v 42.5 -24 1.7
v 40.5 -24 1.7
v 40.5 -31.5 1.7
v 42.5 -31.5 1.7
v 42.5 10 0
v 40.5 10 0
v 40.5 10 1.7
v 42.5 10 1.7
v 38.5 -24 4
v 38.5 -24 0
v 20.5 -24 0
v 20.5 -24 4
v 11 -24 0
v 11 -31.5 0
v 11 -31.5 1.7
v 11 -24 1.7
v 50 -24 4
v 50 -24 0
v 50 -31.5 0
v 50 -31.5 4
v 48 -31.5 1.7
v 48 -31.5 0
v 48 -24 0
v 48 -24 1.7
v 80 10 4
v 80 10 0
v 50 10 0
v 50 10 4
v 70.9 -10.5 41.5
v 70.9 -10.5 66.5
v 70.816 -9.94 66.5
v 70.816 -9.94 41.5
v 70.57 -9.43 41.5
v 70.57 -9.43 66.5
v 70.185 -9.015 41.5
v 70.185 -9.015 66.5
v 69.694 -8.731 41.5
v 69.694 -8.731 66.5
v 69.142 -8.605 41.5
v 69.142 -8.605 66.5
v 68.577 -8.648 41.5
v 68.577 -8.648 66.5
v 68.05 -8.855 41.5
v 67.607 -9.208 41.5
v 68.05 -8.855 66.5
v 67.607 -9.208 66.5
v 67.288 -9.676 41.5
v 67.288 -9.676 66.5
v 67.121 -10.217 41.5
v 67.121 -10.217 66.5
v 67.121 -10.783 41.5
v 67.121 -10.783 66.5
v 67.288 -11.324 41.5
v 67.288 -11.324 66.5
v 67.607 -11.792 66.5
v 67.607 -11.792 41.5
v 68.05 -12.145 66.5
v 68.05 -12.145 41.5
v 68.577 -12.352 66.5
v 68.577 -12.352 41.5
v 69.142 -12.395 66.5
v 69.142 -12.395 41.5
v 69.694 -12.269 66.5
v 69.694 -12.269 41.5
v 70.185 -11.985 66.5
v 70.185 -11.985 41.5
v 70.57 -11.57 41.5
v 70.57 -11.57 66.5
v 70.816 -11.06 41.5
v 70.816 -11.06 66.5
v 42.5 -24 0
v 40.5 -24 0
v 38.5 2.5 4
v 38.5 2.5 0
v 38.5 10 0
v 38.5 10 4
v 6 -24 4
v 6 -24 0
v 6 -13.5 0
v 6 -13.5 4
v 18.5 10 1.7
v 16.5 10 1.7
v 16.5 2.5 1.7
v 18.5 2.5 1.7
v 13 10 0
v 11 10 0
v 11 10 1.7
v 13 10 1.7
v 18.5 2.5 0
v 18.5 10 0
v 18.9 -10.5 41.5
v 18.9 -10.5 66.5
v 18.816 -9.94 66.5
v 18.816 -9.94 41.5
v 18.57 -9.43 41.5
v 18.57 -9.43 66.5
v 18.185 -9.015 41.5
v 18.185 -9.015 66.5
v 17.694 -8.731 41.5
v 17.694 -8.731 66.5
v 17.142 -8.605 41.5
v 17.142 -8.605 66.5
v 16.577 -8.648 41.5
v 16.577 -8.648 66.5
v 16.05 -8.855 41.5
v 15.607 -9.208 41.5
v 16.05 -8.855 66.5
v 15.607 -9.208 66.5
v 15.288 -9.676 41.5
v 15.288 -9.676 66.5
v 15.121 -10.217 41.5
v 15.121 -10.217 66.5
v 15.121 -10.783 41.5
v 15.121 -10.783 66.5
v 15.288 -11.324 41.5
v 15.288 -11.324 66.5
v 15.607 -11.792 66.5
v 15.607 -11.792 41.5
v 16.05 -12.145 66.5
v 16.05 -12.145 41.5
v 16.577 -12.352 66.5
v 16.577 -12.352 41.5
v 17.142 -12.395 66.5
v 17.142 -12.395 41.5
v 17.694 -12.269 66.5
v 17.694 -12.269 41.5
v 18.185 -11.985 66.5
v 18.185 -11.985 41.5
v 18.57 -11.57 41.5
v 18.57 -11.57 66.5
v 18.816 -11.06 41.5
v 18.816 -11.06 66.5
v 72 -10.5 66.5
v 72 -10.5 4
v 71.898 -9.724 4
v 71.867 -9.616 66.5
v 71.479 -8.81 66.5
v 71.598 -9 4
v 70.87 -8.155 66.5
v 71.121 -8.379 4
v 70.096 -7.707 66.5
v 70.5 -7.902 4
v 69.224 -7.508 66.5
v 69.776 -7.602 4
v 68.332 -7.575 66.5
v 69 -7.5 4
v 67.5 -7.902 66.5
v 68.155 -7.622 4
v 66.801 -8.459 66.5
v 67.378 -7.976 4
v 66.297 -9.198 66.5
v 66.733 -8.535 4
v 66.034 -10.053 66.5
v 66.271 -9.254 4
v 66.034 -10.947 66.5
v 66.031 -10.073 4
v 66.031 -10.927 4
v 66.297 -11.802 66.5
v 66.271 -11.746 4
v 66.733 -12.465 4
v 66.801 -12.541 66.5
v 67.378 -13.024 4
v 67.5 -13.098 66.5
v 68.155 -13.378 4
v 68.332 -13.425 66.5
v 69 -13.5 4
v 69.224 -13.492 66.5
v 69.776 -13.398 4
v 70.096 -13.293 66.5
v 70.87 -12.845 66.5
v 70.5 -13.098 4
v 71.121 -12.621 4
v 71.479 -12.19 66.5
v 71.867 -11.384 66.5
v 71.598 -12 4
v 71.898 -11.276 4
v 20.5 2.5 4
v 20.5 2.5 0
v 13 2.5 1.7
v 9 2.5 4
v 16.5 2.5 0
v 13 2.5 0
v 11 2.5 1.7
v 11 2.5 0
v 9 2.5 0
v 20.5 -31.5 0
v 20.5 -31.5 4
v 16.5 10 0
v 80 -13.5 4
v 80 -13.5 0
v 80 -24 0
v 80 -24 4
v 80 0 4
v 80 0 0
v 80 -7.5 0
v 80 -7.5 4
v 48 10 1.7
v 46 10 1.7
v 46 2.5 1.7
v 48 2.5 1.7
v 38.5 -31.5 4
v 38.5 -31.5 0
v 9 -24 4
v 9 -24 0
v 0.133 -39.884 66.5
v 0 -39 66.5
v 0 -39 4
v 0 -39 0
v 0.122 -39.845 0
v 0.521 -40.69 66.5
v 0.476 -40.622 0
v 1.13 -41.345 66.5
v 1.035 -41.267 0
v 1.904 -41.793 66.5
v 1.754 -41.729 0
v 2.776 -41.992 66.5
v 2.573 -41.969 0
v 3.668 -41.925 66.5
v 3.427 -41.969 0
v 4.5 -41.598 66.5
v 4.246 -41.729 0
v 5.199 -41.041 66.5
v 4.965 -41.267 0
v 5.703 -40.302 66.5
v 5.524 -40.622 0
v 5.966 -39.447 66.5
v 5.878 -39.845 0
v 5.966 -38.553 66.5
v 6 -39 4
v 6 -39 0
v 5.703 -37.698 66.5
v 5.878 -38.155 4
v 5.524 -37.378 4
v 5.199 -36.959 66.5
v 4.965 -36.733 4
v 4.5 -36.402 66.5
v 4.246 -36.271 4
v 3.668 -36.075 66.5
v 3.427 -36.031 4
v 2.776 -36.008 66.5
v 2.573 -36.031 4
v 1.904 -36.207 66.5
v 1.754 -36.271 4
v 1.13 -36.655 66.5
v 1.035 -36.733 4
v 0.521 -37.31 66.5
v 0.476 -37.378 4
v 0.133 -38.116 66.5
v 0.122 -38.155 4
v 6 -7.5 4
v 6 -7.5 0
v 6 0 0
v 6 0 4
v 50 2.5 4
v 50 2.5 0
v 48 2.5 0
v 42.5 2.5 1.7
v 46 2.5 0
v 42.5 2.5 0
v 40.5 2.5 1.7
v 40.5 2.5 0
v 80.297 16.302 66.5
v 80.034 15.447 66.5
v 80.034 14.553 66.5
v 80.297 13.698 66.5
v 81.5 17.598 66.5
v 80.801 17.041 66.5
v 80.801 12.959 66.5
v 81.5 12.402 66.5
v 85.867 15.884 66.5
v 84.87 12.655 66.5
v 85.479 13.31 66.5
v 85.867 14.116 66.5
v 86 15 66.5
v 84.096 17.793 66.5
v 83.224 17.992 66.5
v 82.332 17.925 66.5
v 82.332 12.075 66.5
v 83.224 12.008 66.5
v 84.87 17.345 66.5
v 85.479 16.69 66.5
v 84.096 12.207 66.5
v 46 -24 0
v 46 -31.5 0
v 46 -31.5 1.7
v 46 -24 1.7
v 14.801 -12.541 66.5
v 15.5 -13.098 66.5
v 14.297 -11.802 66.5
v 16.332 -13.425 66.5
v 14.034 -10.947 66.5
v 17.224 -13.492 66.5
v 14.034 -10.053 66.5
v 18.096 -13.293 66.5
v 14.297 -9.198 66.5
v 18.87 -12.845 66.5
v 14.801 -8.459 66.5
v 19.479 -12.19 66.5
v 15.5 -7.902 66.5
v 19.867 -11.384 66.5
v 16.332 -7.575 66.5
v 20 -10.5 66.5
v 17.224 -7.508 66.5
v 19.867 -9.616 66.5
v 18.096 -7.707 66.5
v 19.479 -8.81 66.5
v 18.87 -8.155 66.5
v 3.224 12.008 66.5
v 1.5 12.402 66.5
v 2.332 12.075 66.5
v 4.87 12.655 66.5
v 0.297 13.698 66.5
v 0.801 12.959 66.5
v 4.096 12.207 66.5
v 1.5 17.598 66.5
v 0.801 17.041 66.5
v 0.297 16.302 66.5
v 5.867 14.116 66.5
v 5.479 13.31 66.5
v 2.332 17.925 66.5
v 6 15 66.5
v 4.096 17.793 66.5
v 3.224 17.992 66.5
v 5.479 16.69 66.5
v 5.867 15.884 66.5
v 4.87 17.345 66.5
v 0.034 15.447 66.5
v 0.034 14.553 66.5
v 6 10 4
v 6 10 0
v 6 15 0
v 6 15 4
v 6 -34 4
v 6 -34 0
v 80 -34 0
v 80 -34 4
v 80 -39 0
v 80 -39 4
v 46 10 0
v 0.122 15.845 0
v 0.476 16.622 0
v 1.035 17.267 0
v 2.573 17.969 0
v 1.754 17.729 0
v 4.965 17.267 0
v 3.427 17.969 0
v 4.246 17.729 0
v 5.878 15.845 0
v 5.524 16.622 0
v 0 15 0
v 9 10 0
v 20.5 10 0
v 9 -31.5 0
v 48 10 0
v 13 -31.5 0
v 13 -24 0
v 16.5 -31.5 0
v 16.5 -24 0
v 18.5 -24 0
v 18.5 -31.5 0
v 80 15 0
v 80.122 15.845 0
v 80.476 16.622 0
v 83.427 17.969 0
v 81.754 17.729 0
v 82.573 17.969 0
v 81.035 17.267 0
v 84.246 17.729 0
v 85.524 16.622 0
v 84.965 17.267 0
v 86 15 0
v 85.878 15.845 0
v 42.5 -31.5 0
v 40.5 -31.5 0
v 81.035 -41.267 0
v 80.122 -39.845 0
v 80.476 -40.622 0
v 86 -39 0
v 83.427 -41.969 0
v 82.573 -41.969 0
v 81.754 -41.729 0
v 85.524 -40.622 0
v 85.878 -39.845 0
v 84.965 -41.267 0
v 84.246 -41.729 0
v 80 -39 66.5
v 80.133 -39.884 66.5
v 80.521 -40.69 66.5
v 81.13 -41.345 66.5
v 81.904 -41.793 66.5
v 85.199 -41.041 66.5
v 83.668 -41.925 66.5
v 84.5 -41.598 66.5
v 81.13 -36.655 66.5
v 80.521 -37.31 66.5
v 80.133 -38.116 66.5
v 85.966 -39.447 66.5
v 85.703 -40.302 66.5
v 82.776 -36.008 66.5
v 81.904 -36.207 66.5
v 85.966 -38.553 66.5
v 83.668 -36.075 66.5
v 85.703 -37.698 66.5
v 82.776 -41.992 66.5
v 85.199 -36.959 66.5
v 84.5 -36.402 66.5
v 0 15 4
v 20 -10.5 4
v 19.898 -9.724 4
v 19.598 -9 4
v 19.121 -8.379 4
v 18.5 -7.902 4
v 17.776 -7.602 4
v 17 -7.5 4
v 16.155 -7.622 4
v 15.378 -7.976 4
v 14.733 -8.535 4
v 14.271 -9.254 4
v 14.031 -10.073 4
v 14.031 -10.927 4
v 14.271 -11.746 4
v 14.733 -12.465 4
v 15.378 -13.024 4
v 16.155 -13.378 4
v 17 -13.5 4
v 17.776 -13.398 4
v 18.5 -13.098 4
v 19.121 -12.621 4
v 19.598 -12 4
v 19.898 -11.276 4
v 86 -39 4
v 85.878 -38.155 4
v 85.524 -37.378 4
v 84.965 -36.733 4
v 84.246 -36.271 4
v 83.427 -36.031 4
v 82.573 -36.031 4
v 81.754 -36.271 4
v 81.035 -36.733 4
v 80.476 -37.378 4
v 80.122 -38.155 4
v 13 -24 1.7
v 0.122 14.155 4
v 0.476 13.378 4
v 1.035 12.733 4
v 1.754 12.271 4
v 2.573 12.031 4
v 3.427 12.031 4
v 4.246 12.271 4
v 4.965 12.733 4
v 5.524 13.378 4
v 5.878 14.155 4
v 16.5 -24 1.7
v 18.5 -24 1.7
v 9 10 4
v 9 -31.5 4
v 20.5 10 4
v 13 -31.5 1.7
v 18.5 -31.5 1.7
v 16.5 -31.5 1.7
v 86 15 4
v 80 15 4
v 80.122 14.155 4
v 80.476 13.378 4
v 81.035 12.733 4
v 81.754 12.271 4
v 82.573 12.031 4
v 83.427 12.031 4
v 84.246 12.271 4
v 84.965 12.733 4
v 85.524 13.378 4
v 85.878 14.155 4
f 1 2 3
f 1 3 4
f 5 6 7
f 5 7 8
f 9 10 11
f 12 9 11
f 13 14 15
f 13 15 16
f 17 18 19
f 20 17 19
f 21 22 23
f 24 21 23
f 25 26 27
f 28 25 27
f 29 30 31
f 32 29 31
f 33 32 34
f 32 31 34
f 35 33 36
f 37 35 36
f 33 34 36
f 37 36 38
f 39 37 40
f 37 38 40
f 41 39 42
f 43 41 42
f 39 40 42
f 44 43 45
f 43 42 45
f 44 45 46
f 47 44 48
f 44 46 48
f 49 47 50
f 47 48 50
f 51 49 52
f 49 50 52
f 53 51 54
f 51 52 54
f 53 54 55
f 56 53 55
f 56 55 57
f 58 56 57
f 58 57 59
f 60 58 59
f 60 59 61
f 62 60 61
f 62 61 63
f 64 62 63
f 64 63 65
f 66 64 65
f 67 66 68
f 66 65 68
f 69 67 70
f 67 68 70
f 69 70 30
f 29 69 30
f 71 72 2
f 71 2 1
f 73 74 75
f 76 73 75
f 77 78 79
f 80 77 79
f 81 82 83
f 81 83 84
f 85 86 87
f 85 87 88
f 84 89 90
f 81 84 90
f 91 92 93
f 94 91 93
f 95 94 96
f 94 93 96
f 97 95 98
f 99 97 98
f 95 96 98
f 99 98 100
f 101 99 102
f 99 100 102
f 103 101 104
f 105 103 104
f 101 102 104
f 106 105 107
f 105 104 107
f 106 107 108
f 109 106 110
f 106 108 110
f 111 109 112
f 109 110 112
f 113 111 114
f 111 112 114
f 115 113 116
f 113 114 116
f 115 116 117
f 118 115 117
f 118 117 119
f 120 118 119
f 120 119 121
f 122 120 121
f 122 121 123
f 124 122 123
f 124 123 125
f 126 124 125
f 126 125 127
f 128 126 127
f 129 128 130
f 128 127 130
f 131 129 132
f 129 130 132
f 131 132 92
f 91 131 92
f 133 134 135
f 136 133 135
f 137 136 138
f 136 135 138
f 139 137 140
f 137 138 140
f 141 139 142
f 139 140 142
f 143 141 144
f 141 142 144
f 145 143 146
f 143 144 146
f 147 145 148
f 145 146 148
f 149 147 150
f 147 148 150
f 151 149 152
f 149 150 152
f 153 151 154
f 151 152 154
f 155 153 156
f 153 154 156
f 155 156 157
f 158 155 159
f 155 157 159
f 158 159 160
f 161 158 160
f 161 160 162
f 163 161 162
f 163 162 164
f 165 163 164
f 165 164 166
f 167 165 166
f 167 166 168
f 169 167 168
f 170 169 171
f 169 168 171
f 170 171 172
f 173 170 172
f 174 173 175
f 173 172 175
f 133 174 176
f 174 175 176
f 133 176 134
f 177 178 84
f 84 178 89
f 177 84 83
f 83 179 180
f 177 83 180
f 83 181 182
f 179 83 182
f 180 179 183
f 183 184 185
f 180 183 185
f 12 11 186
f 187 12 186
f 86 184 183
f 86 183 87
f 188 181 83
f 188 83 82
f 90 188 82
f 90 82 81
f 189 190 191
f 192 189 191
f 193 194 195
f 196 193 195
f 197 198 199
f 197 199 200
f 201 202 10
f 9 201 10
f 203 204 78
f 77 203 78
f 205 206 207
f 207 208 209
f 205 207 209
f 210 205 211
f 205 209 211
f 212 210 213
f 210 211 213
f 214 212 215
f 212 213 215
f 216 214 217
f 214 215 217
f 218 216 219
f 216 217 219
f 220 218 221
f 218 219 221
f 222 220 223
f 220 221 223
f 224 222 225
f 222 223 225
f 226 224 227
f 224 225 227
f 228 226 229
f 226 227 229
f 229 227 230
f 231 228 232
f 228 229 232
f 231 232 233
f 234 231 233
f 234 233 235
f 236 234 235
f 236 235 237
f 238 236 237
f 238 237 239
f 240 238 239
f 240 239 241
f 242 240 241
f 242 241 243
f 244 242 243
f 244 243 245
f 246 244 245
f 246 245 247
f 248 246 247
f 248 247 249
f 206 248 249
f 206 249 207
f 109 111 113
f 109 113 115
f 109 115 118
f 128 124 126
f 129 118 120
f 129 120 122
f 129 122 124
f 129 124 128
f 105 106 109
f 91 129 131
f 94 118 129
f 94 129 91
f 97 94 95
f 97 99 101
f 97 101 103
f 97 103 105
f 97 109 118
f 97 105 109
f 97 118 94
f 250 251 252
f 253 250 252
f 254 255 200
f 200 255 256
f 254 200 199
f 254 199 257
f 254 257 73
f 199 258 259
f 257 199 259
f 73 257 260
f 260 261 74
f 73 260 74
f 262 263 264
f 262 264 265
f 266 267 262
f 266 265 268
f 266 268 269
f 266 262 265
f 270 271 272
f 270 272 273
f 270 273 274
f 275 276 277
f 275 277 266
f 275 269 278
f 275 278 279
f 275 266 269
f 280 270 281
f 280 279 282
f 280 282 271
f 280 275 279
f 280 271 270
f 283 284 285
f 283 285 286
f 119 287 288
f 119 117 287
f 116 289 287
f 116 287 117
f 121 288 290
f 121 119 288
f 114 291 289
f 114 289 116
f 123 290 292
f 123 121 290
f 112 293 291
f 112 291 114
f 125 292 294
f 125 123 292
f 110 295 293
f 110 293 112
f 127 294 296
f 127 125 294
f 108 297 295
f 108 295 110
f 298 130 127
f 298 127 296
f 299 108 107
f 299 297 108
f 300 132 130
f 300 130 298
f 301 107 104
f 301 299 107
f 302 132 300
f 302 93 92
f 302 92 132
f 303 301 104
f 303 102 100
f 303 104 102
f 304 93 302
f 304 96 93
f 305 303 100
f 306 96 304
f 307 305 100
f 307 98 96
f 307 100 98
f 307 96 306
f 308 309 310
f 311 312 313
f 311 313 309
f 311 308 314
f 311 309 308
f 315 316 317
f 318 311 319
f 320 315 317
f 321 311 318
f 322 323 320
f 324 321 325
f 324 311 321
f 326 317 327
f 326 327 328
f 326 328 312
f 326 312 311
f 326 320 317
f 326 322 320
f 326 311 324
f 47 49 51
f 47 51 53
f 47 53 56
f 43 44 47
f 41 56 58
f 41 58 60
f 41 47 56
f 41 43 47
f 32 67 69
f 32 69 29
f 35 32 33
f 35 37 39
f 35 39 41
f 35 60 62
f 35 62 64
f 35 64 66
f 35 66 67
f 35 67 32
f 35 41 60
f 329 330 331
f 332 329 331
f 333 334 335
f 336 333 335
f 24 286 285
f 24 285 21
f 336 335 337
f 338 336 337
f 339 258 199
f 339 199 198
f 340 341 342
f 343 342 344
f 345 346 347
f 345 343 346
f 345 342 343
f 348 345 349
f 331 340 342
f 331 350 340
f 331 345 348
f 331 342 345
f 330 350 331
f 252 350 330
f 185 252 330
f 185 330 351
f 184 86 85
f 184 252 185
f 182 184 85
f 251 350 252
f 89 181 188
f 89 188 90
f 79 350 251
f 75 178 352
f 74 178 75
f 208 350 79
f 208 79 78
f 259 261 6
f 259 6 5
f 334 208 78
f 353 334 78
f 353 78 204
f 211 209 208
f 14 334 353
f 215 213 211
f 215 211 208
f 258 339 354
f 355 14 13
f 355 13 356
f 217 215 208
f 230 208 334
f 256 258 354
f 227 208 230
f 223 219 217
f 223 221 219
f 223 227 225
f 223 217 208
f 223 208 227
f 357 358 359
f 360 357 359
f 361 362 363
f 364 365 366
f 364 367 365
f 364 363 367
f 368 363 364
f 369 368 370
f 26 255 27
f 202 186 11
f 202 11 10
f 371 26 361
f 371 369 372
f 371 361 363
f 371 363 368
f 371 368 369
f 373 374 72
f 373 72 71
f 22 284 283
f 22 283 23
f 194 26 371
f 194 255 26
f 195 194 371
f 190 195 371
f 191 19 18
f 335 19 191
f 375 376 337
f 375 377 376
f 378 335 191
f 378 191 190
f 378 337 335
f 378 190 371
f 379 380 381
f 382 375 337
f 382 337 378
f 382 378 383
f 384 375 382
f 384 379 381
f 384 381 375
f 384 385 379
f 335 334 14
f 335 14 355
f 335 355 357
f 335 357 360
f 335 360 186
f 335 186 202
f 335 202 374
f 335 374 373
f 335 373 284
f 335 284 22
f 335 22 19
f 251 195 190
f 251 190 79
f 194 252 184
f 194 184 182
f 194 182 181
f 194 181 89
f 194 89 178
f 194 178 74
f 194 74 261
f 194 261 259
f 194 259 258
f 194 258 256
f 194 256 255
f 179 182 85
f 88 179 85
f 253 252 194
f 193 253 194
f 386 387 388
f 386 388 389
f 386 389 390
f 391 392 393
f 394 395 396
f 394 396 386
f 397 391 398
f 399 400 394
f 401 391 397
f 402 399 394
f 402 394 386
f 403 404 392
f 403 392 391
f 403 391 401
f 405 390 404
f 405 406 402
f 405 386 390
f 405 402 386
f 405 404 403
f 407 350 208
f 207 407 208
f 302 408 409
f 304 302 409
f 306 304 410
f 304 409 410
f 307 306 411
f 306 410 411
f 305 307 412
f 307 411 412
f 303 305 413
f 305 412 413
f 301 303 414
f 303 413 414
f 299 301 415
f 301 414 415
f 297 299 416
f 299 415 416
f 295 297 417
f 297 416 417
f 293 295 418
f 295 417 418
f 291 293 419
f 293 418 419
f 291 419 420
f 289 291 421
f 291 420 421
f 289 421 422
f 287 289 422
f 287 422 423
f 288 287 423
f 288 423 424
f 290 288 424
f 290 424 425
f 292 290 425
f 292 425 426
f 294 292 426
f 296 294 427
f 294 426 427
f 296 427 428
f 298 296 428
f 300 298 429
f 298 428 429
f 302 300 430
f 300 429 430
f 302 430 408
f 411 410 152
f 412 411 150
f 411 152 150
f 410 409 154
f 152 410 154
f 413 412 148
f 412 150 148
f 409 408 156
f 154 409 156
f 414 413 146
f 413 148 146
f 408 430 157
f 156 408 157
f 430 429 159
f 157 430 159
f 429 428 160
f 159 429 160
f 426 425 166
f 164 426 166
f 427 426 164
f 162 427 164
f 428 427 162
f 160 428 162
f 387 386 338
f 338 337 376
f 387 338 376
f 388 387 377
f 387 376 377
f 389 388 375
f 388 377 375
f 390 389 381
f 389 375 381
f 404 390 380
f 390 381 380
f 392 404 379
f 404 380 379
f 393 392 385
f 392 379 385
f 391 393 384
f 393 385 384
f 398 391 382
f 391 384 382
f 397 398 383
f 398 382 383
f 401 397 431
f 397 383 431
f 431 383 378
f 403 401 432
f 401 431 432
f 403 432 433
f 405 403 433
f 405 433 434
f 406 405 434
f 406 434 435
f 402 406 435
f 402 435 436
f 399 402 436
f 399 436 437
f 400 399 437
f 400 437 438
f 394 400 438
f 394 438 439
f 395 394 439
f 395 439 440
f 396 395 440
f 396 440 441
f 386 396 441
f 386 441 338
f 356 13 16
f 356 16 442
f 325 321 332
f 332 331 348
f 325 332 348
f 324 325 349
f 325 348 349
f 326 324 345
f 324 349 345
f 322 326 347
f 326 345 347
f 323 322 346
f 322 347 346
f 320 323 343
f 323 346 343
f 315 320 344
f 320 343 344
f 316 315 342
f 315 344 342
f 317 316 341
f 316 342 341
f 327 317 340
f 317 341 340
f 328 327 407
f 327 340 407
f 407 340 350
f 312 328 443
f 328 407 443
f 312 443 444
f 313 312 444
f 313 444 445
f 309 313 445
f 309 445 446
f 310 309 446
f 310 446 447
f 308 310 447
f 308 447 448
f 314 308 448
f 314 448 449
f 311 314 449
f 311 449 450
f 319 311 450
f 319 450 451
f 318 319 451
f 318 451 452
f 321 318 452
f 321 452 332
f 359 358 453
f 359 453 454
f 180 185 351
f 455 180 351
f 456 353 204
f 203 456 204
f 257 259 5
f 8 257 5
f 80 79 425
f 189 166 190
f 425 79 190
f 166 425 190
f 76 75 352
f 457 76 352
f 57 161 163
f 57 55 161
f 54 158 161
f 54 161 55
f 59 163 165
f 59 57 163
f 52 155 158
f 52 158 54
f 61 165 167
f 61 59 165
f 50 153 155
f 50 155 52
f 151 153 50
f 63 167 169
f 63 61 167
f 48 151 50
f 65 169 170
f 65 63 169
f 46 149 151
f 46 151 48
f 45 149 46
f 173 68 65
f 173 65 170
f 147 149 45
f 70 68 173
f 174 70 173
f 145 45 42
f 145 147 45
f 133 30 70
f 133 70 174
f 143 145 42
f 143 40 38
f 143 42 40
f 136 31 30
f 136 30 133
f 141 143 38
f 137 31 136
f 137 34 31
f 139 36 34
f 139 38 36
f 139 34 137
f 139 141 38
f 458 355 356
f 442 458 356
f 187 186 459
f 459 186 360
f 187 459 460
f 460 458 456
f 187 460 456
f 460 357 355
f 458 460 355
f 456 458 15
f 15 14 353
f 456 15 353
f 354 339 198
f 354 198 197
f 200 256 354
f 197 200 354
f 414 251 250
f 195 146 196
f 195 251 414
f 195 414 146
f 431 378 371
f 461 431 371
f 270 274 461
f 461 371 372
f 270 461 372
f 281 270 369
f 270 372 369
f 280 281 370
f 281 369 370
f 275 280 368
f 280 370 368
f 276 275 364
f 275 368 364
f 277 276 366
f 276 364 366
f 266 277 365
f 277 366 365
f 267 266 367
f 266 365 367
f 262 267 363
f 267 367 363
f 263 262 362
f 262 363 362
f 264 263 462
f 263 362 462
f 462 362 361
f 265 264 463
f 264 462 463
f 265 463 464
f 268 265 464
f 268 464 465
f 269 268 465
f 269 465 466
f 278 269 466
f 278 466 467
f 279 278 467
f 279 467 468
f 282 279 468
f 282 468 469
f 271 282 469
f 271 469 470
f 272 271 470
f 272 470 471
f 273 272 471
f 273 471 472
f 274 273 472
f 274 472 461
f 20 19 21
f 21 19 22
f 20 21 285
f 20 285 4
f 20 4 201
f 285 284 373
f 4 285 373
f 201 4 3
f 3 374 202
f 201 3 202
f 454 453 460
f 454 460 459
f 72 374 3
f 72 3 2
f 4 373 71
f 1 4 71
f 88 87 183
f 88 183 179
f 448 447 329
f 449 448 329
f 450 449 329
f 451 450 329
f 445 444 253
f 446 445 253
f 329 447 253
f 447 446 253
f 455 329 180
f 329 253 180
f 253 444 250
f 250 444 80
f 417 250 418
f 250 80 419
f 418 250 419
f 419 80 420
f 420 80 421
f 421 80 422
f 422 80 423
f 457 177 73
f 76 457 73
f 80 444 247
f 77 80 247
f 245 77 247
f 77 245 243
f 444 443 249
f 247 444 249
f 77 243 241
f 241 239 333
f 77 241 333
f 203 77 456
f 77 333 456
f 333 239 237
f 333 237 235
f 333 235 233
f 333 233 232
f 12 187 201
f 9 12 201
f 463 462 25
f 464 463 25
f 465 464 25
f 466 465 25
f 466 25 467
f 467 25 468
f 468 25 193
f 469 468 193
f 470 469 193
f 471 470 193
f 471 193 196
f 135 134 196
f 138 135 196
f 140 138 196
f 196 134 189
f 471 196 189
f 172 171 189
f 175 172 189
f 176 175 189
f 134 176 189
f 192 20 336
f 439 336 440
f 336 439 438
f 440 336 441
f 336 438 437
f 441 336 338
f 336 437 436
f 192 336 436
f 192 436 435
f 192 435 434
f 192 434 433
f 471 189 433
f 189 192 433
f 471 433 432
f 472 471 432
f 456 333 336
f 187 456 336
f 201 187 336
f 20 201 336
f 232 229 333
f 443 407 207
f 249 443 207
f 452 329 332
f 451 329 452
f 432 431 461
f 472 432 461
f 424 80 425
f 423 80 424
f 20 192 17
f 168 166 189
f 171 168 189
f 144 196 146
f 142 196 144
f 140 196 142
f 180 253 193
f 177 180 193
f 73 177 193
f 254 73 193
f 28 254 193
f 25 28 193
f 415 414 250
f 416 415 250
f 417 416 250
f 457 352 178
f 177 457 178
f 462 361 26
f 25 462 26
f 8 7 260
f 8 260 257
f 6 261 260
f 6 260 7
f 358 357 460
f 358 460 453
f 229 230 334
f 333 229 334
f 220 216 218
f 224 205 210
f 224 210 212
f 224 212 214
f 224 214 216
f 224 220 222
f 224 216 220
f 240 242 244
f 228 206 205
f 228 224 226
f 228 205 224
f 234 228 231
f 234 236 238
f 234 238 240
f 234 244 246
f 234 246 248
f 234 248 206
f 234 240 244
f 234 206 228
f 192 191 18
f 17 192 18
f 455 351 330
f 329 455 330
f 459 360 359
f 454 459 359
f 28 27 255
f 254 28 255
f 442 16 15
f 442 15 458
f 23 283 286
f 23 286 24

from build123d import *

# Parameters (mm, degrees)
F1_DEPTH  = 4
F2_W      = 2
F2_H      = 7.5
F3_DEPTH  = 1.7
F5_DEPTH  = 62.5
F4_R      = 3
F7_W      = 74
F7_H      = 6
F8_DEPTH  = 4
F9_R      = 1.9
F10_R     = 1.9
F11_DEPTH = 25


with BuildPart() as f1:
    # F0 (on Top) → F1 (new body)
    with BuildSketch(Plane.XY):
        with BuildLine():
            Line((6, 0), (80, 0))
            Line((80, 0), (80, -24))
            Line((80, -24), (80, -34))
            Line((80, -34), (80, -39))
            ThreePointArc((80, -39), (83, -42), (86, -39))
            Line((86, -39), (86, 15))
            ThreePointArc((86, 15), (83, 18), (80, 15))
            Line((80, 15), (80, 10))
            Line((80, 10), (50, 10))
            Line((50, 10), (50, 2.5))
            Line((50, 2.5), (38.5, 2.5))
            Line((38.5, 2.5), (38.5, 10))
            Line((38.5, 10), (20.5, 10))
            Line((20.5, 10), (20.5, 2.5))
            Line((20.5, 2.5), (9, 2.5))
            Line((9, 2.5), (9, 10))
            Line((9, 10), (6, 10))
            Line((6, 10), (6, 15))
            ThreePointArc((6, 15), (3, 18), (0, 15))
            Line((0, 15), (0, -39))
            ThreePointArc((0, -39), (3, -42), (6, -39))
            Line((6, -39), (6, -34))
            Line((6, -34), (6, -24))
            Line((6, -24), (6, 0))
        make_face()
        Polygon((80, -34), (80, -24), (50, -24), (50, -31.5), (38.5, -31.5), (38.5, -24), (20.5, -24), (20.5, -31.5), (9, -31.5), (9, -24), (6, -24), (6, -34), align=None)
    extrude(amount=F1_DEPTH)

    # F2 (on Top) → F3 (join)
    with BuildSketch(Plane.XY):
        with Locations((12, 6.25)):
            Rectangle(F2_W, F2_H)
        with Locations((17.5, 6.25)):
            Rectangle(F2_W, F2_H)
        with Locations((41.5, 6.25)):
            Rectangle(F2_W, F2_H)
        with Locations((47, 6.25)):
            Rectangle(F2_W, F2_H)
        with Locations((12, -27.75)):
            Rectangle(F2_W, F2_H)
        with Locations((17.5, -27.75)):
            Rectangle(F2_W, F2_H)
        with Locations((41.5, -27.75)):
            Rectangle(F2_W, F2_H)
        with Locations((47, -27.75)):
            Rectangle(F2_W, F2_H)
    extrude(amount=F3_DEPTH)

    # F4 (on face) → F5 (join)
    with BuildSketch(Plane.XY.offset(4)):
        with BuildLine():
            ThreePointArc((0, 15), (3, 12), (6, 15))
            ThreePointArc((6, 15), (3, 18), (0, 15))
        make_face()
        with BuildLine():
            ThreePointArc((6, -39), (3, -36), (0, -39))
            ThreePointArc((0, -39), (3, -42), (6, -39))
        make_face()
        with BuildLine():
            ThreePointArc((86, -39), (83, -36), (80, -39))
            ThreePointArc((80, -39), (83, -42), (86, -39))
        make_face()
        with BuildLine():
            ThreePointArc((80, 15), (83, 12), (86, 15))
            ThreePointArc((86, 15), (83, 18), (80, 15))
        make_face()
    extrude(amount=F5_DEPTH)



with BuildPart() as f5:
    # F4 (on face) → F5, piece 2 (new body)
    with BuildSketch(Plane.XY.offset(4)):
        with Locations((17, -10.5)):
            Circle(F4_R)
    extrude(amount=F5_DEPTH)


with BuildPart() as f5b:
    # F4 (on face) → F5, piece 3 (new body)
    with BuildSketch(Plane.XY.offset(4)):
        with Locations((69, -10.5)):
            Circle(F4_R)
    extrude(amount=F5_DEPTH)


with BuildPart() as f1_1:
    add(f1.part)

    add(f5.part)  # F8 merges F5

    add(f5b.part)  # F8 merges F5b
    # F7 (on face) → F8 (join)
    with BuildSketch(Plane(origin=(0, 0, 0), x_dir=(1, 0, 0), z_dir=(0, 0, -1))):
        with Locations((43, 10.5)):
            Rectangle(F7_W, F7_H)
    extrude(amount=-F8_DEPTH)

    # F9 (on face) + F10 (on face) → F11 (cut)
    with BuildSketch(Plane.XY.offset(66.5)):
        with Locations((17, -10.5)):
            Circle(F9_R)
    with BuildSketch(Plane.XY.offset(66.5)):
        with Locations((69, -10.5)):
            Circle(F10_R)
    extrude(amount=-F11_DEPTH, mode=Mode.SUBTRACT)


solid = f1_1.part
